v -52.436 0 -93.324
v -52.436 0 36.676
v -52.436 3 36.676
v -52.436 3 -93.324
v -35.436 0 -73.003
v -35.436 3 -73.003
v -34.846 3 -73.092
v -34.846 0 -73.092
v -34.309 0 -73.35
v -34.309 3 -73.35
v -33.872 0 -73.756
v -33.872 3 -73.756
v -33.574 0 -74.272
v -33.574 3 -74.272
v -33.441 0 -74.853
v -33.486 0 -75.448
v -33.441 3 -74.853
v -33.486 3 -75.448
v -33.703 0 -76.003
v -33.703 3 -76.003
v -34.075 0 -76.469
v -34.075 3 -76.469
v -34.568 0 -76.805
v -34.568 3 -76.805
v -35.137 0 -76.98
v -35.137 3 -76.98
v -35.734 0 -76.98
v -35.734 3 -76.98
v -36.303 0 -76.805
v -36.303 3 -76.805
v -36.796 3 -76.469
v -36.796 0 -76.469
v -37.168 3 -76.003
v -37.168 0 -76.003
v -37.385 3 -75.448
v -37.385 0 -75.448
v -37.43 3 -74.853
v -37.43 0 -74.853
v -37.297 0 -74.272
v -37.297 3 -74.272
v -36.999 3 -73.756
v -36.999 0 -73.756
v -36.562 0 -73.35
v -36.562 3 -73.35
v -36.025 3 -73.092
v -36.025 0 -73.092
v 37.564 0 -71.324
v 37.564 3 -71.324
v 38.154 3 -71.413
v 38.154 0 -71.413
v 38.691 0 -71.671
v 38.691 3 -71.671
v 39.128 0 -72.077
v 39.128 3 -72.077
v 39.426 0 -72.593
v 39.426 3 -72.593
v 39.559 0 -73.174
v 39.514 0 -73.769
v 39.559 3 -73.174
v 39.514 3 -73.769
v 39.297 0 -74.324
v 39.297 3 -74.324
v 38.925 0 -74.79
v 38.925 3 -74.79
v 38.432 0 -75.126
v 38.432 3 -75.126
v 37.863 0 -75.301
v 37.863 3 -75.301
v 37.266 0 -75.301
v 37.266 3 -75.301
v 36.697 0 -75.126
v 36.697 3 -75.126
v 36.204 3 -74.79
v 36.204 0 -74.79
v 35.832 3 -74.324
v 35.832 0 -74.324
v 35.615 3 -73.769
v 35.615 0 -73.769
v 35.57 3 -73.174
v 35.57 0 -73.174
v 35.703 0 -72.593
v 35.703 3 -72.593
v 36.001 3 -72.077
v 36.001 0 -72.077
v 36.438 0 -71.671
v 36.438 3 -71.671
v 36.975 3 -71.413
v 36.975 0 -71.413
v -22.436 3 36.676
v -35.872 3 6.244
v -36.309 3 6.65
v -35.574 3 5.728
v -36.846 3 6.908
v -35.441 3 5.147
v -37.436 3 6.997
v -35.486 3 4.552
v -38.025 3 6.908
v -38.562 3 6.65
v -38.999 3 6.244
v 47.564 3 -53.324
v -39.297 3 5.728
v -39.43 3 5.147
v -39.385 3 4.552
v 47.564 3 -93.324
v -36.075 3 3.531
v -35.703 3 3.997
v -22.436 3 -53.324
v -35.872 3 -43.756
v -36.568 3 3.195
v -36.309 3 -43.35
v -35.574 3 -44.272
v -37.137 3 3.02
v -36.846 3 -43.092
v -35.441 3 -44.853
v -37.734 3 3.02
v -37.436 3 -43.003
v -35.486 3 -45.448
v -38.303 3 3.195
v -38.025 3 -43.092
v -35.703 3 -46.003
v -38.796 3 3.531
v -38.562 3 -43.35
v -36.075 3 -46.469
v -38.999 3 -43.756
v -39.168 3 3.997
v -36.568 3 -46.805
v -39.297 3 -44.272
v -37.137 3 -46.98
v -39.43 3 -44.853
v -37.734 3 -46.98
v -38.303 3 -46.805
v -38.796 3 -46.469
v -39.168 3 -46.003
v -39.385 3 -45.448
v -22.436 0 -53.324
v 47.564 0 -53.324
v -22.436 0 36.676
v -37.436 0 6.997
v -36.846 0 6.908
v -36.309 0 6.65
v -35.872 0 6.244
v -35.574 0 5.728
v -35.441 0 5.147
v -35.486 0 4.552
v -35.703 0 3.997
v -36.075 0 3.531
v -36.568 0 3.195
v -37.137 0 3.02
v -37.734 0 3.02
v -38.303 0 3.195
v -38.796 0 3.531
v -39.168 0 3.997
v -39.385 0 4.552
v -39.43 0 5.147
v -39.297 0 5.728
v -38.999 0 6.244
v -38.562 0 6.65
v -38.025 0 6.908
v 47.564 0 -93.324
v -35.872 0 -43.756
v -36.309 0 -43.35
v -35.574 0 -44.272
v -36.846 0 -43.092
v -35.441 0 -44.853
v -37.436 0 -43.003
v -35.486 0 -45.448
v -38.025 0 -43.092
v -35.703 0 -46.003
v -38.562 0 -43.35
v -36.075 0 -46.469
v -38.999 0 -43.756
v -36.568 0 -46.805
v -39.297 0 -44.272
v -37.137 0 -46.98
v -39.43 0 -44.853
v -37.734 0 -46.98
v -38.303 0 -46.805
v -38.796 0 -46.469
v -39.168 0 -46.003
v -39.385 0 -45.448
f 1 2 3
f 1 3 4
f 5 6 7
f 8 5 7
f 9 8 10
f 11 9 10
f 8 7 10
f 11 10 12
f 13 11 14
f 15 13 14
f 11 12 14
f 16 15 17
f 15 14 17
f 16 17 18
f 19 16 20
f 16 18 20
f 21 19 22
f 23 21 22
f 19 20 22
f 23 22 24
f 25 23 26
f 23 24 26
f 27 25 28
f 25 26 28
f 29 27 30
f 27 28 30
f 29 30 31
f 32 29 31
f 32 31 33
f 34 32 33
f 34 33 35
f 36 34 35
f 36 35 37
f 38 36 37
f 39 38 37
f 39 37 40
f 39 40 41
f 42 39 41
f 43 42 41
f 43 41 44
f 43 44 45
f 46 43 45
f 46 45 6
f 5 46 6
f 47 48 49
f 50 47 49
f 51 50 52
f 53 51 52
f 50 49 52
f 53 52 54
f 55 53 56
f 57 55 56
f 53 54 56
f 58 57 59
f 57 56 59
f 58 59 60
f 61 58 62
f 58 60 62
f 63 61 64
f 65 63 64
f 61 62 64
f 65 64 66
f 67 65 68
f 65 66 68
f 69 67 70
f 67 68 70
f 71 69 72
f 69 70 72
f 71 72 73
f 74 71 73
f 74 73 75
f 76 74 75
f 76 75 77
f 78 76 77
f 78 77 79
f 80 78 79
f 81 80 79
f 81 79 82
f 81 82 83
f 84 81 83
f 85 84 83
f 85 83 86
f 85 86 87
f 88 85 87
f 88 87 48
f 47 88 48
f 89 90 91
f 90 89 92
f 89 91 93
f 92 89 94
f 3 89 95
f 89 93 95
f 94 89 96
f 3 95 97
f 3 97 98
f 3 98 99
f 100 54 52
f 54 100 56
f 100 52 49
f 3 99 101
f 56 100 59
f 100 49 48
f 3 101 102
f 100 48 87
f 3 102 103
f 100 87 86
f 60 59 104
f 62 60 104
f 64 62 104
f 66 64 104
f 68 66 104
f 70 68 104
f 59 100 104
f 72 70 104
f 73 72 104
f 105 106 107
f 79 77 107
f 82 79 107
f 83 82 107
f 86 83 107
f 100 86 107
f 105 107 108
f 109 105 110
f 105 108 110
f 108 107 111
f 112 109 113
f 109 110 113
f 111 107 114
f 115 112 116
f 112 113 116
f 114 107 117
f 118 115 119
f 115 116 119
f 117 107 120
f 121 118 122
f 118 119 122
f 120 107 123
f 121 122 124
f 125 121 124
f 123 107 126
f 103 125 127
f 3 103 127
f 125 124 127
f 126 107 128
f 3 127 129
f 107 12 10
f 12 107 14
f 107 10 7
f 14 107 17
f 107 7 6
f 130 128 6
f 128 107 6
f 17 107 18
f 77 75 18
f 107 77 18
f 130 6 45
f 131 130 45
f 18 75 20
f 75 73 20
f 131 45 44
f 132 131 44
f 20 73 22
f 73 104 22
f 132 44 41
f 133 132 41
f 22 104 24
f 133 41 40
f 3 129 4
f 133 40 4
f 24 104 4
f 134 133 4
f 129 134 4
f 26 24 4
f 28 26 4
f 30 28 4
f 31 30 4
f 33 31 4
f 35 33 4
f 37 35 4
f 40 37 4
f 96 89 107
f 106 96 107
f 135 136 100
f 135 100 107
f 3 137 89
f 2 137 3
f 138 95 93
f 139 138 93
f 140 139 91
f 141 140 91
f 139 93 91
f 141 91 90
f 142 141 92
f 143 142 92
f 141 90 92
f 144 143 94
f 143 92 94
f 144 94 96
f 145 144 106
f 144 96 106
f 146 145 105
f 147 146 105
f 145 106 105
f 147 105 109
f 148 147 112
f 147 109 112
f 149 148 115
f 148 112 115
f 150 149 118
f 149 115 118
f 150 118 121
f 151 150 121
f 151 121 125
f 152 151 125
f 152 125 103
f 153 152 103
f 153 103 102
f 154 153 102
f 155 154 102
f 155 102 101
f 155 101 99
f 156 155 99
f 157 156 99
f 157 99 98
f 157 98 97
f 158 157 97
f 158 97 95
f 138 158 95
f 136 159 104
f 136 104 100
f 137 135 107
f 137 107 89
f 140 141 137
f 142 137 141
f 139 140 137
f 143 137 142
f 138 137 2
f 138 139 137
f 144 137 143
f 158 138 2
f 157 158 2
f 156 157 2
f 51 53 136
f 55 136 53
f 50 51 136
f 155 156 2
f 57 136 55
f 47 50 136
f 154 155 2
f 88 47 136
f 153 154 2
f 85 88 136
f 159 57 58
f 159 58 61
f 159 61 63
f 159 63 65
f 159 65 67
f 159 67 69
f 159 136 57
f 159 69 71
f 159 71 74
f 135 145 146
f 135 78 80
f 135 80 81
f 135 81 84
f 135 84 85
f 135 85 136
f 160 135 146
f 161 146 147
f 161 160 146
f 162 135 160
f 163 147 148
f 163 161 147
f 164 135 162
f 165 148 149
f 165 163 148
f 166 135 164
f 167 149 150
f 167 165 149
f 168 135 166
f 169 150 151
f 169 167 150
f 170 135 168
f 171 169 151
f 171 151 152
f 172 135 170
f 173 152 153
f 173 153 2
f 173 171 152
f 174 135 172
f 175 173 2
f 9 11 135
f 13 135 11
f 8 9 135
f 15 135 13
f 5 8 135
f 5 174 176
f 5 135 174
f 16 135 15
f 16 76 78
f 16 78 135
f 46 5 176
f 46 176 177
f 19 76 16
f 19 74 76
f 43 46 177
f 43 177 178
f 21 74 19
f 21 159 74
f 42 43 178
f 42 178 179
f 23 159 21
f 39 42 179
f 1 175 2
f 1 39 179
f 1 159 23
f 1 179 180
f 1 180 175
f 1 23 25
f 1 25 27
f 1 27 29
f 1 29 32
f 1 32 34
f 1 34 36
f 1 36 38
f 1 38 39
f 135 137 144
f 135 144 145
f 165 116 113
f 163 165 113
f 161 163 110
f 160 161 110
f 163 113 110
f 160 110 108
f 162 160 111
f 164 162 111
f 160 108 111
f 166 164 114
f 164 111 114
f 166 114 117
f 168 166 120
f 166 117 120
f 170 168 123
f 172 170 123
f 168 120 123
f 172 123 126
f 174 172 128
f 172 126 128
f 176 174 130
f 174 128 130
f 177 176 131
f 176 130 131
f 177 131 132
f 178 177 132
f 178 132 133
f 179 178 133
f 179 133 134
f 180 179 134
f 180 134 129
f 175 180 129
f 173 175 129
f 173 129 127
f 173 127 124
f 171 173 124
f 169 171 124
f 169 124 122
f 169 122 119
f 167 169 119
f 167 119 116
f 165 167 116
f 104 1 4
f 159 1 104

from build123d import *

# Parameters (mm, degrees)
SALIENTE_EXTRUIR1_DEPTH = 3
CROQUIS2_R              = 2
SALIENTE_EXTRUIR2_DEPTH = 3
CROQUIS3_R              = 2
CORTAR_EXTRUIR1_DEPTH   = 108.087875812


with BuildPart() as part:
    # Croquis1 → Saliente-Extruir1 (new body)
    with BuildSketch(Plane(origin=(0, 0, 0), x_dir=(1, 0, 0), z_dir=(0, 1, 0))):
        Polygon((-22.435530086, -36.676217765), (-52.435530086, -36.676217765), (-52.435530086, 93.323782235), (47.564469914, 93.323782235), (47.564469914, 53.323782235), (-22.435530086, 53.323782235), align=None)
    extrude(amount=SALIENTE_EXTRUIR1_DEPTH)

    # Croquis2 → Saliente-Extruir2 (add, through all)
    with BuildSketch(Plane(origin=(0, 3, 0), x_dir=(1, 0, 0), z_dir=(0, 1, 0))):
        with Locations((37.564469914, 73.323782235)):
            Circle(CROQUIS2_R)
        with Locations((-35.435530086, 75.002673531)):
            Circle(CROQUIS2_R)
        with Locations((-37.435530086, 45.002673531)):
            Circle(CROQUIS2_R)
        with Locations((-37.435530086, -4.997326469)):
            Circle(CROQUIS2_R)
    extrude(amount=-SALIENTE_EXTRUIR2_DEPTH)

    # Croquis3 → Cortar-Extruir1 (cut, through all)
    with BuildSketch(Plane(origin=(0, 3, 0), x_dir=(1, 0, 0), z_dir=(0, 1, 0))):
        with Locations(Location((37.564469914, 73.323782235, 0), (0, 0, 270))):
            Circle(CROQUIS3_R)
        with Locations(Location((-37.435530086, 45.002673531, 0), (0, 0, 270))):
            Circle(CROQUIS3_R)
        with Locations(Location((-37.435530086, -4.997326469, 0), (0, 0, 270))):
            Circle(CROQUIS3_R)
        with Locations(Location((-35.435530086, 75.002673531, 0), (0, 0, 270))):
            Circle(CROQUIS3_R)
    extrude(amount=-CORTAR_EXTRUIR1_DEPTH, mode=Mode.SUBTRACT)


solid = part.part
